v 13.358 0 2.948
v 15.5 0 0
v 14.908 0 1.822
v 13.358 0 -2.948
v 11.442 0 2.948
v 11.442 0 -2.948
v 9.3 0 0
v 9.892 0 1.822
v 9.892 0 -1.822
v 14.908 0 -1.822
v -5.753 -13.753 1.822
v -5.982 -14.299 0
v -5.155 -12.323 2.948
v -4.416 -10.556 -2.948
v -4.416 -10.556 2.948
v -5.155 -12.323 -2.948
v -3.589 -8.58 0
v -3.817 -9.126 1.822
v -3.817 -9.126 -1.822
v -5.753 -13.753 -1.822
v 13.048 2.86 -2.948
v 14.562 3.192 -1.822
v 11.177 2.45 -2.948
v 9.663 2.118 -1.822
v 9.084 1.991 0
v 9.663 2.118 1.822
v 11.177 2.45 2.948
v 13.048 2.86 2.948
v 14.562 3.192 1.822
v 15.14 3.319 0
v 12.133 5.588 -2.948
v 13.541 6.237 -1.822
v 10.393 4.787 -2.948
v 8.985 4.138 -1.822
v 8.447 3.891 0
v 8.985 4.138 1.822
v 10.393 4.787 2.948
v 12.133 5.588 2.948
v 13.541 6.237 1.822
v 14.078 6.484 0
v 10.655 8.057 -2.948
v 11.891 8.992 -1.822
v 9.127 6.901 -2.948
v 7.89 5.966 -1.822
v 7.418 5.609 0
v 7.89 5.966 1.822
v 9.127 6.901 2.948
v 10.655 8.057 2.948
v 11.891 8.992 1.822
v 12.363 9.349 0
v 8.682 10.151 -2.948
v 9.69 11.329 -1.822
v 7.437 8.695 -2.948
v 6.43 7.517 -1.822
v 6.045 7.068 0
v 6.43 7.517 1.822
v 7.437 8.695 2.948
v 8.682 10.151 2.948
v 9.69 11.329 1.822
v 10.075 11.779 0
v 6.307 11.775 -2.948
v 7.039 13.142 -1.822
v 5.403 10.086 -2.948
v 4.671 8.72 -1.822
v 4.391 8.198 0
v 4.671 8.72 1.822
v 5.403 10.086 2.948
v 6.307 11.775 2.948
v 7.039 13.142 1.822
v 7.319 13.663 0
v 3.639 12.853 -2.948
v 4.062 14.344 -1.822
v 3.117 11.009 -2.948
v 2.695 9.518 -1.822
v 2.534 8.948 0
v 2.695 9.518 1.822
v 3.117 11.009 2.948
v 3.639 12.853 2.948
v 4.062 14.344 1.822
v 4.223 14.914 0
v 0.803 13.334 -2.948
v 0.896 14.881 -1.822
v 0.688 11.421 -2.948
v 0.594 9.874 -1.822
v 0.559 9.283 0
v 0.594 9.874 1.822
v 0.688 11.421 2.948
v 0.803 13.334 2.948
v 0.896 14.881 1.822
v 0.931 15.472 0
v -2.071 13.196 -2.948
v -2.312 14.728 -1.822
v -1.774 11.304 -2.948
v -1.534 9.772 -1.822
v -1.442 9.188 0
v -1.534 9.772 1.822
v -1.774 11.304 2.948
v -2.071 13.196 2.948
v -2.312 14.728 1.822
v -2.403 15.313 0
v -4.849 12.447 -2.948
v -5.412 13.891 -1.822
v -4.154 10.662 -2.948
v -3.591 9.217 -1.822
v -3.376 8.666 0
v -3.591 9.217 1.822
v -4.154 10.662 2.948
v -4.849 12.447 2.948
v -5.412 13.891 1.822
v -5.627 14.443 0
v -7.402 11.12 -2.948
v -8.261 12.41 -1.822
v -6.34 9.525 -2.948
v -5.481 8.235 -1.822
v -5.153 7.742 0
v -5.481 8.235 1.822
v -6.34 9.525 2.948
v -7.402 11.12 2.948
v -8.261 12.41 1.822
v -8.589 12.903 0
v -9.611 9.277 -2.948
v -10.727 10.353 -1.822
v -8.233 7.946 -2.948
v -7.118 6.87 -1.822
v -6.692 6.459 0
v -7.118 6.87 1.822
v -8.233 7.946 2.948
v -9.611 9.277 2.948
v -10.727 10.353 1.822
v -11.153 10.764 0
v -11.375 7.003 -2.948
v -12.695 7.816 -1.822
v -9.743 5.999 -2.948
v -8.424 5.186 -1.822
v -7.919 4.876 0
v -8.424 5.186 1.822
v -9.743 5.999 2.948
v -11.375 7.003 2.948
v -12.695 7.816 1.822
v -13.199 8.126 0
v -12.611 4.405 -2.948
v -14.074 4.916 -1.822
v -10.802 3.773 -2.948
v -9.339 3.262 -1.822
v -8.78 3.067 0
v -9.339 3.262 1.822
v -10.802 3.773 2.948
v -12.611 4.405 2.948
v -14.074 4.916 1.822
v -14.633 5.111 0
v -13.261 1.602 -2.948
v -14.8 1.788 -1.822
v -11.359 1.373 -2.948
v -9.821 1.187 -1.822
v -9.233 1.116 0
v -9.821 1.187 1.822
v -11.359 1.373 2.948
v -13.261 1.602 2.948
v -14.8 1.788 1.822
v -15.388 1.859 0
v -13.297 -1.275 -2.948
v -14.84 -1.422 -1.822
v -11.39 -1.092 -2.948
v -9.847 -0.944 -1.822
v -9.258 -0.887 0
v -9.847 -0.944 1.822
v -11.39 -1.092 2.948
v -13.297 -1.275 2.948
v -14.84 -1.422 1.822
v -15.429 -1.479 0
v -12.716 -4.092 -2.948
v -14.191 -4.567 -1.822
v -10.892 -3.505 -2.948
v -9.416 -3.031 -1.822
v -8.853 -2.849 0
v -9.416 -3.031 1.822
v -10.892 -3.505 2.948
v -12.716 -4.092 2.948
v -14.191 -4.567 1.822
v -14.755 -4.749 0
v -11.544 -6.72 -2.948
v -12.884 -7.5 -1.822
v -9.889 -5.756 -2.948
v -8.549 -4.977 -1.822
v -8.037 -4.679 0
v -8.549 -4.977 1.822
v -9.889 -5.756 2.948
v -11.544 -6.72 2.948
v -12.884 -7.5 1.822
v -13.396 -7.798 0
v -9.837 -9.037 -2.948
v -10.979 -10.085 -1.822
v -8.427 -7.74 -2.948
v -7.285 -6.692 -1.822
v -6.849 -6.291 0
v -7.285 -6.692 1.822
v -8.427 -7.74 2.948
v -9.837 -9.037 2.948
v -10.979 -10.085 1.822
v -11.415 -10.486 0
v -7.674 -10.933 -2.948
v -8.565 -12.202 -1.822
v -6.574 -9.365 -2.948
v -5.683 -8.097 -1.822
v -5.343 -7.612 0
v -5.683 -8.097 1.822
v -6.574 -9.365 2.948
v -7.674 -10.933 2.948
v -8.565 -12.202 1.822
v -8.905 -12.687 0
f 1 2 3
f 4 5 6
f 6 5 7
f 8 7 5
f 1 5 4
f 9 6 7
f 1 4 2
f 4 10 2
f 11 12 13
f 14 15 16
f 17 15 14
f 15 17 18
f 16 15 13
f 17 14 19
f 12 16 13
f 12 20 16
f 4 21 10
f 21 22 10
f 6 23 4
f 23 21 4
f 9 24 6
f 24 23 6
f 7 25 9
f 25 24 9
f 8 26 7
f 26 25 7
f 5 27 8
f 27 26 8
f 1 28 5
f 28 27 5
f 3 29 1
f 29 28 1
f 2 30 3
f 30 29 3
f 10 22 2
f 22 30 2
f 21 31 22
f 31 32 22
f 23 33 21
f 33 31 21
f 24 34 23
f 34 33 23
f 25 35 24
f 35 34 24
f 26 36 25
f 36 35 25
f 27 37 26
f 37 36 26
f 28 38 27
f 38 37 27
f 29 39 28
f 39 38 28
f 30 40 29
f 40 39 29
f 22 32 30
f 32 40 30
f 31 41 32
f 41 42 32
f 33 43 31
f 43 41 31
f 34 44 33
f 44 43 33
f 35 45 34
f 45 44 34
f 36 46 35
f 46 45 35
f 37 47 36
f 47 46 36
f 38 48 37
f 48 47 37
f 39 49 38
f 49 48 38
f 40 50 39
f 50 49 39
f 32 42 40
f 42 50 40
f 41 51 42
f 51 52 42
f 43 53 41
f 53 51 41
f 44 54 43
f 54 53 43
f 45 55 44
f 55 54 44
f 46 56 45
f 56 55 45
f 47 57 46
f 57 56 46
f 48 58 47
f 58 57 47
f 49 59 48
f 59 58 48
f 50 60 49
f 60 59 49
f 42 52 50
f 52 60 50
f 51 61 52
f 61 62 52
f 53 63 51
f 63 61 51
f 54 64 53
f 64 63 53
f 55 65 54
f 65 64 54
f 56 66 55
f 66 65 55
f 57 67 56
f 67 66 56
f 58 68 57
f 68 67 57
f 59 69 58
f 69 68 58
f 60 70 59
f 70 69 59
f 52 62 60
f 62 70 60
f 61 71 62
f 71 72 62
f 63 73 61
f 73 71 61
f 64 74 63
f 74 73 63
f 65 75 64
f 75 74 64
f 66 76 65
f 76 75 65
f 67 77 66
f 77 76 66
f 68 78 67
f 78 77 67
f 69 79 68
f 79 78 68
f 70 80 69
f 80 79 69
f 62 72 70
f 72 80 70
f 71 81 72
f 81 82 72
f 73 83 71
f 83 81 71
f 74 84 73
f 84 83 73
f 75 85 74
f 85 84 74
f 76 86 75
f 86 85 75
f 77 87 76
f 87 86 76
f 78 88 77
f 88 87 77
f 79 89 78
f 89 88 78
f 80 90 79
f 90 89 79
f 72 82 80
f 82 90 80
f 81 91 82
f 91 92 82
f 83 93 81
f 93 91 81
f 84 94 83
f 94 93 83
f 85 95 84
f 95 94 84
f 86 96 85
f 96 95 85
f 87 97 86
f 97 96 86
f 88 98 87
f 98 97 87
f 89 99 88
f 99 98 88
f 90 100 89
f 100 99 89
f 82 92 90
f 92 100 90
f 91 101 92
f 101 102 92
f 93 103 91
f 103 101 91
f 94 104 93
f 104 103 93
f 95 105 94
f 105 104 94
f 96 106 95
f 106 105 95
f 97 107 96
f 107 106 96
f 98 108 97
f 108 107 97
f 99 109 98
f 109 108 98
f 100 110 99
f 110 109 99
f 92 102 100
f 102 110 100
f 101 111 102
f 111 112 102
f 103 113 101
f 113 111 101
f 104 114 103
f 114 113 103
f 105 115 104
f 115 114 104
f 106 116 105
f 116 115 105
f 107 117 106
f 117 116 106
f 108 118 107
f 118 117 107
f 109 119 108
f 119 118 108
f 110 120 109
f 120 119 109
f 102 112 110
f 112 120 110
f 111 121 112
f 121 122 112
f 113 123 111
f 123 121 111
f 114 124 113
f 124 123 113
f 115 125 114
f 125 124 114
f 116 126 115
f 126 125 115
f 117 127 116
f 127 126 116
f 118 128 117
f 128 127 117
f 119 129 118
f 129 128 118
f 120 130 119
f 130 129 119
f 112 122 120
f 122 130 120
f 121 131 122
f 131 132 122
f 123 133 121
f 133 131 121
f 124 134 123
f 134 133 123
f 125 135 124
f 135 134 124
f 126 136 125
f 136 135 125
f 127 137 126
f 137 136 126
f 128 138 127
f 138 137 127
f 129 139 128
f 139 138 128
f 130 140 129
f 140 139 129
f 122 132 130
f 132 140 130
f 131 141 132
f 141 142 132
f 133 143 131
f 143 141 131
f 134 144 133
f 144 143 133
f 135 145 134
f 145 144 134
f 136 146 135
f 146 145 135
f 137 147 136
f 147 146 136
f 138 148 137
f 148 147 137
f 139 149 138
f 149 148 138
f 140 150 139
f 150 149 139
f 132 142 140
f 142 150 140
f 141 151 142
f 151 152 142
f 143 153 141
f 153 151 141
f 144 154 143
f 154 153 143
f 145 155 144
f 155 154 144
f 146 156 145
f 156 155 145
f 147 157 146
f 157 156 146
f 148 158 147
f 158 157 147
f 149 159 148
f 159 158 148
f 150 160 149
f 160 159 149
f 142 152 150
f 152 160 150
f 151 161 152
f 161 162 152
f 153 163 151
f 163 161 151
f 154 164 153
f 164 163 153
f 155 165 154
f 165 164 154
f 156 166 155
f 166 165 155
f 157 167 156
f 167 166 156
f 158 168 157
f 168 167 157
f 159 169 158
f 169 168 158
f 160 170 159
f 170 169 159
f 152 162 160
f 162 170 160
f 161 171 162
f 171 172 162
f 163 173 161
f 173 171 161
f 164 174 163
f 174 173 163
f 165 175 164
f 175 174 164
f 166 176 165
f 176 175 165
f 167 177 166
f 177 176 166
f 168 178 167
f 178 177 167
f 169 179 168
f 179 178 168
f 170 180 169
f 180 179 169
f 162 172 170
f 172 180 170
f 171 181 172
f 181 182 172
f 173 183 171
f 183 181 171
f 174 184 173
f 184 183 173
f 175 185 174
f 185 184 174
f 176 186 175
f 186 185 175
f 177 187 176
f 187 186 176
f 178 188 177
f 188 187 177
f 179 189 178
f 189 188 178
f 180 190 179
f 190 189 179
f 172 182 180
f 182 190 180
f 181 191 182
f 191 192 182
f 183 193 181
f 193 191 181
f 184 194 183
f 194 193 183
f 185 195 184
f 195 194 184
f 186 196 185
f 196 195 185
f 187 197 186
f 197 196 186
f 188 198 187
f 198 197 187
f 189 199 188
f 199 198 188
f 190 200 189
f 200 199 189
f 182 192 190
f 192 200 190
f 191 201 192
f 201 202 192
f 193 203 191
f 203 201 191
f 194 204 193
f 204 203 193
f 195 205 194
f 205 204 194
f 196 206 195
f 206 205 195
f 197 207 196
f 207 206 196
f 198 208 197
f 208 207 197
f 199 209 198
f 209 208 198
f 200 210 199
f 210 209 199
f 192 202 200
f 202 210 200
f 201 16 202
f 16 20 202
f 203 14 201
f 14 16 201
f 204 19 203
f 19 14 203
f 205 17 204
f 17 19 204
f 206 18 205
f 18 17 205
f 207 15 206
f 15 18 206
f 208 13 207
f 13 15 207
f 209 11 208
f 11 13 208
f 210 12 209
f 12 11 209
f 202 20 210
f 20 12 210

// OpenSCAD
rotate_extrude(angle = 247.3) translate([12.4, 0]) circle(r = 3.1);
